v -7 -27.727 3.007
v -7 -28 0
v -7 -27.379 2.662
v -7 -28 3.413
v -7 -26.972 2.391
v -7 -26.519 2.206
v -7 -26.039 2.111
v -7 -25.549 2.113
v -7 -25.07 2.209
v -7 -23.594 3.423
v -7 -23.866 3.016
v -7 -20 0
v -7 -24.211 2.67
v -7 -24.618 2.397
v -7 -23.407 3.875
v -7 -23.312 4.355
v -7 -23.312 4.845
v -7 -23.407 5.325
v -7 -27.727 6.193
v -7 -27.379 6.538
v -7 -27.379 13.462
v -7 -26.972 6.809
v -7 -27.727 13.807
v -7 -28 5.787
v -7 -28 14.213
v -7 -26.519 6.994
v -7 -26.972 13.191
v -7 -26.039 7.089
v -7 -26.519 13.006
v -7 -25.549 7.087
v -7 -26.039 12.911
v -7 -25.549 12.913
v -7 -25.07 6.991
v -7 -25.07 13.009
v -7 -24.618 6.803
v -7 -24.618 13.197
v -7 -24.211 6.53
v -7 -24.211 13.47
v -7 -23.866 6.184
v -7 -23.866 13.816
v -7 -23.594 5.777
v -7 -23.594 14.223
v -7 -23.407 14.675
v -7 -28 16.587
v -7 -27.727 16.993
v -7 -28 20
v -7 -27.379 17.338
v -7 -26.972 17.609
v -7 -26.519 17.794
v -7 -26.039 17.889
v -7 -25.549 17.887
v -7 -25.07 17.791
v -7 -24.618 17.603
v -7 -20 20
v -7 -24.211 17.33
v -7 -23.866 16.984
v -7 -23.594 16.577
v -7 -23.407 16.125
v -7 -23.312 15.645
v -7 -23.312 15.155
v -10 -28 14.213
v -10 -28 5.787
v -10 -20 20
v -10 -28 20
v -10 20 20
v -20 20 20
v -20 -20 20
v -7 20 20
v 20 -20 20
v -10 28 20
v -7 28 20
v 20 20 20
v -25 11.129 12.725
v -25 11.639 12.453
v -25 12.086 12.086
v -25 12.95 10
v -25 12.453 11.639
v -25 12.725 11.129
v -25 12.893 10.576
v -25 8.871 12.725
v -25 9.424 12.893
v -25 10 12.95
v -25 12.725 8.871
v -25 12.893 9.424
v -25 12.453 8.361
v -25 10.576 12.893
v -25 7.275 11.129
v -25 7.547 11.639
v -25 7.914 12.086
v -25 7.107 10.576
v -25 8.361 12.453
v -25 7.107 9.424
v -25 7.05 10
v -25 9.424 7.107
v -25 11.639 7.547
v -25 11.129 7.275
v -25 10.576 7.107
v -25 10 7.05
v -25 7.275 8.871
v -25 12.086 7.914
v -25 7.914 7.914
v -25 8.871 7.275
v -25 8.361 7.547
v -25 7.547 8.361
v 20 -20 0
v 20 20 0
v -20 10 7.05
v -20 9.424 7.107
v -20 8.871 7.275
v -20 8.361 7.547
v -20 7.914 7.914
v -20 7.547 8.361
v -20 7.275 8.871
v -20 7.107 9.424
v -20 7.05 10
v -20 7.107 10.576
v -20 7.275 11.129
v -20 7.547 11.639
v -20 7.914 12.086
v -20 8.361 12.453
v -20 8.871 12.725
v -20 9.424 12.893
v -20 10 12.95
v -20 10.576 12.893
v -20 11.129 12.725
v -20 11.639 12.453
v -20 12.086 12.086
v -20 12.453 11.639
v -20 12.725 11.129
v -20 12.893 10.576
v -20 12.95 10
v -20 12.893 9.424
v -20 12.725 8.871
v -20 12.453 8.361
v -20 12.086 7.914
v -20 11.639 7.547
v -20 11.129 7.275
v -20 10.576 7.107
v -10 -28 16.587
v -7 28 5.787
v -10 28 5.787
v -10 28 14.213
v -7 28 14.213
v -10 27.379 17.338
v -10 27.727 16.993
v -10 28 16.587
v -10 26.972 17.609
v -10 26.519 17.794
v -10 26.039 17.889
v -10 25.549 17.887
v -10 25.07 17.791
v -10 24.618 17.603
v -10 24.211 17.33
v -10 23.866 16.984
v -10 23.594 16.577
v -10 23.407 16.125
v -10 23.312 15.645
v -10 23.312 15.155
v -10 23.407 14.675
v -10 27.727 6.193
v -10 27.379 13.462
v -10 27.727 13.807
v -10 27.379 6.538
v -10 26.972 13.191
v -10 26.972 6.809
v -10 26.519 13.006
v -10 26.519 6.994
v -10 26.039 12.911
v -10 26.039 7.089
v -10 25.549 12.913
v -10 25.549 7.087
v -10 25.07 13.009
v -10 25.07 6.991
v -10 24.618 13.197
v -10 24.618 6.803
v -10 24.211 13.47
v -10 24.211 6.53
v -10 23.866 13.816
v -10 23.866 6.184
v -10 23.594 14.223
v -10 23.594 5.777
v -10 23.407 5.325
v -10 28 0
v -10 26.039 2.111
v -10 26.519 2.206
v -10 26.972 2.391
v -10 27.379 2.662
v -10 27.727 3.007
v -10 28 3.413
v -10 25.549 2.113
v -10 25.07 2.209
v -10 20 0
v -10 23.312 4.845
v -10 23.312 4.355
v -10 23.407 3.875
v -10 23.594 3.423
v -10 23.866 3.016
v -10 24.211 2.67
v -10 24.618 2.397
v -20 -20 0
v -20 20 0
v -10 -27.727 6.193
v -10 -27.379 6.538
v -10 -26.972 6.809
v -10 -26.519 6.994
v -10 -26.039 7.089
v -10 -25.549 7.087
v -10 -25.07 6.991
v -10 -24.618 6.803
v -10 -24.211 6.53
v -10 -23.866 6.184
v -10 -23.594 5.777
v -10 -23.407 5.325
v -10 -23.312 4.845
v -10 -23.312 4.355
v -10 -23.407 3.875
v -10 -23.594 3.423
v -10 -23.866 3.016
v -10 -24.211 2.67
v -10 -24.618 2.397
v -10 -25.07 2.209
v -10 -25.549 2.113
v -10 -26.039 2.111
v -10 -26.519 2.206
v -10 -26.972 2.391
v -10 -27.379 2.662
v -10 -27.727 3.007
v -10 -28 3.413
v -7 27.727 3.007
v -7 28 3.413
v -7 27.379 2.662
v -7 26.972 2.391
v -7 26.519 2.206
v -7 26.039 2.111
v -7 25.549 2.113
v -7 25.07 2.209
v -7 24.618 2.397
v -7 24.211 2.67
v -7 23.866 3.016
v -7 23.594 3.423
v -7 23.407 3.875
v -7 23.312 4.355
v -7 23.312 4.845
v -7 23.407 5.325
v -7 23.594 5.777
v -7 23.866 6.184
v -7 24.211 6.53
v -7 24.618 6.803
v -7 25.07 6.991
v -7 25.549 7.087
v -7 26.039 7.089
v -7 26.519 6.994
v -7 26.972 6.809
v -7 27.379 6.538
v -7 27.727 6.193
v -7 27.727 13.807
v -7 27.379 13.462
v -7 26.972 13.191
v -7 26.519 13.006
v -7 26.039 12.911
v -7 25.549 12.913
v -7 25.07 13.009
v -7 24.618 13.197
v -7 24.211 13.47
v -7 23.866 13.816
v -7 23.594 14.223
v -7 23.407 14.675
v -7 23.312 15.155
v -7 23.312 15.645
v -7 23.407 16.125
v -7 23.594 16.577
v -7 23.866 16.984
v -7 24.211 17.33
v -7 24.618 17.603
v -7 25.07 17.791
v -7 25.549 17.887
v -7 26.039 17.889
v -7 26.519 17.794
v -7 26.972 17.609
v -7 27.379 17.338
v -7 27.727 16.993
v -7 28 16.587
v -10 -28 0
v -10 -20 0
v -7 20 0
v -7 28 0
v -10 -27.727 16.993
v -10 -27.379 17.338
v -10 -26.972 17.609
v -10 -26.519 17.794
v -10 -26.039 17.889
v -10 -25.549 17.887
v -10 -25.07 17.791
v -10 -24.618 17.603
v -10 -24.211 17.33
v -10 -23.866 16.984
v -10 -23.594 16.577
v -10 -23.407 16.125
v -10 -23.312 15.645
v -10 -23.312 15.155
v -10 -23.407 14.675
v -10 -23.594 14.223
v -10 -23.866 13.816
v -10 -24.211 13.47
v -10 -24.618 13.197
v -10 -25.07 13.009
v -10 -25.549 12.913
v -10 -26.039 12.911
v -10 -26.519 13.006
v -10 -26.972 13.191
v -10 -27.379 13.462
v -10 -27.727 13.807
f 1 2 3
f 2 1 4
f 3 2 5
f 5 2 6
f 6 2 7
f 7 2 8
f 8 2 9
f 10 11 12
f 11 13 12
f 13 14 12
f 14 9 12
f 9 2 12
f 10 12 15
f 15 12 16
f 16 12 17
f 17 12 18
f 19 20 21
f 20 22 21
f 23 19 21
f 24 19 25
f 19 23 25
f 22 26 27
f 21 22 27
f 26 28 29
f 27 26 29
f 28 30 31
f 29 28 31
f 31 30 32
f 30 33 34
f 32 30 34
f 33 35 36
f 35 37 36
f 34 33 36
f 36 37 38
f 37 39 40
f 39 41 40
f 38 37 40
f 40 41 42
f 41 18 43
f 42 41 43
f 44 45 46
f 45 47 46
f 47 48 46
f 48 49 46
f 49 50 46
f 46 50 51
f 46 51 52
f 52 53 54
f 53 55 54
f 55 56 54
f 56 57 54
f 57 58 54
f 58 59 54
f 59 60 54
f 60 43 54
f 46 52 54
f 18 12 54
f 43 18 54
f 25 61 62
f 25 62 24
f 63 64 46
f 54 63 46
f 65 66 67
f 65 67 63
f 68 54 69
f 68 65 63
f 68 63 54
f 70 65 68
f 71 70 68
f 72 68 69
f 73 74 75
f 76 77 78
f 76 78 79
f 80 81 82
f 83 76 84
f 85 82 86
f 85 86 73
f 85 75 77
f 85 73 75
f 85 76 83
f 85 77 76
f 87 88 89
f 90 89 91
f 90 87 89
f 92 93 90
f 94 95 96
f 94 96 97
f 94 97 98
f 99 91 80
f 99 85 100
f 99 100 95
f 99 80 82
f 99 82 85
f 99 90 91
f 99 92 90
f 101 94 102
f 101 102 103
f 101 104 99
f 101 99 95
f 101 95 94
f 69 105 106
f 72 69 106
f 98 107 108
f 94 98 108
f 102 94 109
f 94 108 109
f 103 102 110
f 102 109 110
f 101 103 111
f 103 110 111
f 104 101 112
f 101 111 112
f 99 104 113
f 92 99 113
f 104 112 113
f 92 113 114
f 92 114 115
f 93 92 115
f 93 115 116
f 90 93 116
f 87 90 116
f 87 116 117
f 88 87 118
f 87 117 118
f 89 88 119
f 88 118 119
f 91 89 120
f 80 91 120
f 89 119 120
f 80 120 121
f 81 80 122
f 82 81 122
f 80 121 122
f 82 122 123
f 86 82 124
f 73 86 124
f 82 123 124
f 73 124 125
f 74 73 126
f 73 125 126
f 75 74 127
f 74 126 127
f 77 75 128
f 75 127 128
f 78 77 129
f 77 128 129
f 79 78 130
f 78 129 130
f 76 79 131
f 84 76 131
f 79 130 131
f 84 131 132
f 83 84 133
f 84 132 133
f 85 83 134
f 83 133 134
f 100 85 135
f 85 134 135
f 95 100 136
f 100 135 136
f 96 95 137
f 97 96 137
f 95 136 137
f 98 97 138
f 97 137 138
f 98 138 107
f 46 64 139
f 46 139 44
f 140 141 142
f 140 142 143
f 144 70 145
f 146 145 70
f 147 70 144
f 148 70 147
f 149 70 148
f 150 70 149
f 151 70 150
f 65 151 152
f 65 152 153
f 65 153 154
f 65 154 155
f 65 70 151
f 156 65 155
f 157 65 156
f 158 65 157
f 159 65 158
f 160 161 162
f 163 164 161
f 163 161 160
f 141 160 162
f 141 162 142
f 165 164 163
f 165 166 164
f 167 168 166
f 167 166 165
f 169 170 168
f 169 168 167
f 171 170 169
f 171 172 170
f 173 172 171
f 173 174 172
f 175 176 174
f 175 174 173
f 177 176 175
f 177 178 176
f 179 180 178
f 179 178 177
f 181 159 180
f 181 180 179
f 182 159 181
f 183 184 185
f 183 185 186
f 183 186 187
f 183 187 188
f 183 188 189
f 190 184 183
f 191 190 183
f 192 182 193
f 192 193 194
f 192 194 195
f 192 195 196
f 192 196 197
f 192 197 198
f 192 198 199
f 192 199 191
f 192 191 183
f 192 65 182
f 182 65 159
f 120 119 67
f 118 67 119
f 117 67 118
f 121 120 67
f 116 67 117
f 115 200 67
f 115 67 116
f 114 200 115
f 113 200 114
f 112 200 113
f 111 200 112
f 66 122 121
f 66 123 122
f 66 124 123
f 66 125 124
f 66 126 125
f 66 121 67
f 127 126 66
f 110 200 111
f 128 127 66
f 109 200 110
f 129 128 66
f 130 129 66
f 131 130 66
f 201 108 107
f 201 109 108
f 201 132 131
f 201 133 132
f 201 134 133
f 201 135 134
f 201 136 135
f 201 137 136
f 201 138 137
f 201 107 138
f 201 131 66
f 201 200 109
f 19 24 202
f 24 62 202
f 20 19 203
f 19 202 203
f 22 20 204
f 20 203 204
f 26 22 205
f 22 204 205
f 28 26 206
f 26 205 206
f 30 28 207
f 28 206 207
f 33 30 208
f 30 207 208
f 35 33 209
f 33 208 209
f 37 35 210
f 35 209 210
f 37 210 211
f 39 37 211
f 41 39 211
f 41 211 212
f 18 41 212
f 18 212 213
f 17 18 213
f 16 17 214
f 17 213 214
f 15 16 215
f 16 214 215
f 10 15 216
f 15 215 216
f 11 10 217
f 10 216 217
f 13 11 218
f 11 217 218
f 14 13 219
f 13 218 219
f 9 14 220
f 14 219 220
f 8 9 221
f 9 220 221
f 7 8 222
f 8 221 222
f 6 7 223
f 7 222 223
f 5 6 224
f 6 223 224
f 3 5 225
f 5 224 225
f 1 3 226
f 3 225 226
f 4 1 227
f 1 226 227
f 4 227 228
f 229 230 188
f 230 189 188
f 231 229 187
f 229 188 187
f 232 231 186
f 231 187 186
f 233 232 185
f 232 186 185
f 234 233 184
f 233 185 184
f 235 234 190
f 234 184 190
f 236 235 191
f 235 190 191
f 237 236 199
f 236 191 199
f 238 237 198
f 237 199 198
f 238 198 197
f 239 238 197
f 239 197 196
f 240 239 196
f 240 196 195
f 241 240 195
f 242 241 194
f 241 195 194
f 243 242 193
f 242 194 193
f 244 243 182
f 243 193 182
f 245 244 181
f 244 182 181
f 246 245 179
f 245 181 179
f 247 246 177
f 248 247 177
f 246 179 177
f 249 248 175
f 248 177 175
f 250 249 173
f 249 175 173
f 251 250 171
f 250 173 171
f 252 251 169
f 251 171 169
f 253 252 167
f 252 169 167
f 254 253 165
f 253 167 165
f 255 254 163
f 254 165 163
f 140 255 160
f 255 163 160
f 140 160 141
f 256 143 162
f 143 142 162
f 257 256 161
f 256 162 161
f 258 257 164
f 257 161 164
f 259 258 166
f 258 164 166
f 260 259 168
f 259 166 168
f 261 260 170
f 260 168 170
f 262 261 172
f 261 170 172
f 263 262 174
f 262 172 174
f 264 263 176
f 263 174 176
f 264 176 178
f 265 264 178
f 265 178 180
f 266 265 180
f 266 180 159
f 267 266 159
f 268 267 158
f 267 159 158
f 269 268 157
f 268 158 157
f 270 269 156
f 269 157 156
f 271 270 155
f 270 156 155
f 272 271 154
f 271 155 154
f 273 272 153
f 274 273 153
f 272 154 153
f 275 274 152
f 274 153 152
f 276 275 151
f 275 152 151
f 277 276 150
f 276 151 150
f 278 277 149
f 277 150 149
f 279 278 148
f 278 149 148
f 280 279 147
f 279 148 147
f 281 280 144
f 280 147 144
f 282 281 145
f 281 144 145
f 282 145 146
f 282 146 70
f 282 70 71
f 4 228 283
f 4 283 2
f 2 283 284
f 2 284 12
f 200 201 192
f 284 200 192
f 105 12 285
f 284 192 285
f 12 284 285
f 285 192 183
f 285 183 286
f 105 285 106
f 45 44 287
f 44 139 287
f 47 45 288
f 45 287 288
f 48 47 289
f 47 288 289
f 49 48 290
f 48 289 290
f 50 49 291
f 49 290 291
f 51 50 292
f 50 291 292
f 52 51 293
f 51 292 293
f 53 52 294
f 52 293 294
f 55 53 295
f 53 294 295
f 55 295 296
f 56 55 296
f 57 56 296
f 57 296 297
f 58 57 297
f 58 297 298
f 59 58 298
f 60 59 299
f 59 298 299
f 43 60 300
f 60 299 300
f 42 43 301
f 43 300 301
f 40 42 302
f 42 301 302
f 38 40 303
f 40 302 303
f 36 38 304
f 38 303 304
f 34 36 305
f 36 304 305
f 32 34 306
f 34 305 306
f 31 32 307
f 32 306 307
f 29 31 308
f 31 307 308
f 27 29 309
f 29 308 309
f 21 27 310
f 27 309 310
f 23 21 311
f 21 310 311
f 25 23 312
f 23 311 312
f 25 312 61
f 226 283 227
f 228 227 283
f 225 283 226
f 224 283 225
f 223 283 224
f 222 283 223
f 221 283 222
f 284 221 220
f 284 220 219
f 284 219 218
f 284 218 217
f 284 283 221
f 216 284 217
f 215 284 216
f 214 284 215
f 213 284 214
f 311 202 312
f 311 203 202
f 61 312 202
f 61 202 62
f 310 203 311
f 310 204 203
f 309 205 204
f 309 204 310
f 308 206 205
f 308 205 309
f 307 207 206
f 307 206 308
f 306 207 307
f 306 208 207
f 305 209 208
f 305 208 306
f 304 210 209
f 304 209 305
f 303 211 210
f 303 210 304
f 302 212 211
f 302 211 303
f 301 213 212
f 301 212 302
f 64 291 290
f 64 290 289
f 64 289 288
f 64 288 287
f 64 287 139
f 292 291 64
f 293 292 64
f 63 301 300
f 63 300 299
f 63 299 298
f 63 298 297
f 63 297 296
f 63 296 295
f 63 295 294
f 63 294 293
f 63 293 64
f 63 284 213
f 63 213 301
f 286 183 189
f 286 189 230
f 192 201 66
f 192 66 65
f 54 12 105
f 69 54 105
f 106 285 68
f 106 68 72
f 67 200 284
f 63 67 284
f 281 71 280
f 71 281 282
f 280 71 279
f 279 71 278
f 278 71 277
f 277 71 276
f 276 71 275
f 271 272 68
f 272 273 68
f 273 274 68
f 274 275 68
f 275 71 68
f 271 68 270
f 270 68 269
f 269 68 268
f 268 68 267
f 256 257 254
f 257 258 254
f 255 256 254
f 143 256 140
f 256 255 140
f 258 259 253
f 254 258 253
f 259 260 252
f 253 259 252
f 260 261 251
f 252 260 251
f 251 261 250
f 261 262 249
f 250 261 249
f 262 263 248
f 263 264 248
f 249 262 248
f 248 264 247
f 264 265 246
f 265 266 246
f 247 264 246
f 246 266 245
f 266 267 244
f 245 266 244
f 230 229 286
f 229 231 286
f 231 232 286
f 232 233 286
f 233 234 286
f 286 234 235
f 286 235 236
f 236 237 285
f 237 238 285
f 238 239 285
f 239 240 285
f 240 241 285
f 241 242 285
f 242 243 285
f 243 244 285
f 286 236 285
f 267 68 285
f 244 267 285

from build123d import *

# Parameters (mm, degrees)
ESQUISSE1_W              = 40
ESQUISSE1_H              = 40
BOSS_EXTRU_1_DEPTH       = 20
ESQUISSE2_W              = 3
ESQUISSE2_H              = 20
BOSS_EXTRU_2_DEPTH       = 8
ESQUISSE3_W              = 3
ESQUISSE3_H              = 20
BOSS_EXTRU_4_DEPTH       = 8
ESQUISSE5_R              = 2.5
ENL_V_MAT_EXTRU_9_DEPTH  = 8
ESQUISSE6_R              = 2.5
ENL_V_MAT_EXTRU_10_DEPTH = 8
ESQUISSE7_R              = 2.95
BOSS_EXTRU_5_DEPTH       = 5


with BuildPart() as part:
    # Esquisse1 → Boss.-Extru.1 (new body)
    with BuildSketch(Plane.XY):
        Rectangle(ESQUISSE1_W, ESQUISSE1_H)
    extrude(amount=BOSS_EXTRU_1_DEPTH)

    # Esquisse2 → Boss.-Extru.2 (add)
    with BuildSketch(Plane(origin=(0, 20, 0), x_dir=(1, 0, 0), z_dir=(0, 1, 0))):
        with Locations((-8.5, -10)):
            Rectangle(ESQUISSE2_W, ESQUISSE2_H)
    extrude(amount=BOSS_EXTRU_2_DEPTH)

    # Esquisse3 → Boss.-Extru.4 (add)
    with BuildSketch(Plane.XZ.offset(20)):
        with Locations((-8.5, 10)):
            Rectangle(ESQUISSE3_W, ESQUISSE3_H)
    extrude(amount=BOSS_EXTRU_4_DEPTH)

    # Esquisse5 → Enlèv. mat.-Extru.9 (cut)
    with BuildSketch(Plane.ZY.offset(10)):
        with Locations((4.6, -25.8)):
            Circle(ESQUISSE5_R)
        with Locations((15.4, -25.8)):
            Circle(ESQUISSE5_R)
    extrude(amount=-ENL_V_MAT_EXTRU_9_DEPTH, mode=Mode.SUBTRACT)

    # Esquisse6 → Enlèv. mat.-Extru.10 (cut)
    with BuildSketch(Plane.ZY.offset(10)):
        with Locations((4.6, 25.8)):
            Circle(ESQUISSE6_R)
        with Locations((15.4, 25.8)):
            Circle(ESQUISSE6_R)
    extrude(amount=-ENL_V_MAT_EXTRU_10_DEPTH, mode=Mode.SUBTRACT)

    # Esquisse7 → Boss.-Extru.5 (add)
    with BuildSketch(Plane.ZY.offset(20)):
        with Locations(Location((10, 10, 0), (0, 0, 180))):
            Circle(ESQUISSE7_R)
    extrude(amount=BOSS_EXTRU_5_DEPTH)


solid = part.part
